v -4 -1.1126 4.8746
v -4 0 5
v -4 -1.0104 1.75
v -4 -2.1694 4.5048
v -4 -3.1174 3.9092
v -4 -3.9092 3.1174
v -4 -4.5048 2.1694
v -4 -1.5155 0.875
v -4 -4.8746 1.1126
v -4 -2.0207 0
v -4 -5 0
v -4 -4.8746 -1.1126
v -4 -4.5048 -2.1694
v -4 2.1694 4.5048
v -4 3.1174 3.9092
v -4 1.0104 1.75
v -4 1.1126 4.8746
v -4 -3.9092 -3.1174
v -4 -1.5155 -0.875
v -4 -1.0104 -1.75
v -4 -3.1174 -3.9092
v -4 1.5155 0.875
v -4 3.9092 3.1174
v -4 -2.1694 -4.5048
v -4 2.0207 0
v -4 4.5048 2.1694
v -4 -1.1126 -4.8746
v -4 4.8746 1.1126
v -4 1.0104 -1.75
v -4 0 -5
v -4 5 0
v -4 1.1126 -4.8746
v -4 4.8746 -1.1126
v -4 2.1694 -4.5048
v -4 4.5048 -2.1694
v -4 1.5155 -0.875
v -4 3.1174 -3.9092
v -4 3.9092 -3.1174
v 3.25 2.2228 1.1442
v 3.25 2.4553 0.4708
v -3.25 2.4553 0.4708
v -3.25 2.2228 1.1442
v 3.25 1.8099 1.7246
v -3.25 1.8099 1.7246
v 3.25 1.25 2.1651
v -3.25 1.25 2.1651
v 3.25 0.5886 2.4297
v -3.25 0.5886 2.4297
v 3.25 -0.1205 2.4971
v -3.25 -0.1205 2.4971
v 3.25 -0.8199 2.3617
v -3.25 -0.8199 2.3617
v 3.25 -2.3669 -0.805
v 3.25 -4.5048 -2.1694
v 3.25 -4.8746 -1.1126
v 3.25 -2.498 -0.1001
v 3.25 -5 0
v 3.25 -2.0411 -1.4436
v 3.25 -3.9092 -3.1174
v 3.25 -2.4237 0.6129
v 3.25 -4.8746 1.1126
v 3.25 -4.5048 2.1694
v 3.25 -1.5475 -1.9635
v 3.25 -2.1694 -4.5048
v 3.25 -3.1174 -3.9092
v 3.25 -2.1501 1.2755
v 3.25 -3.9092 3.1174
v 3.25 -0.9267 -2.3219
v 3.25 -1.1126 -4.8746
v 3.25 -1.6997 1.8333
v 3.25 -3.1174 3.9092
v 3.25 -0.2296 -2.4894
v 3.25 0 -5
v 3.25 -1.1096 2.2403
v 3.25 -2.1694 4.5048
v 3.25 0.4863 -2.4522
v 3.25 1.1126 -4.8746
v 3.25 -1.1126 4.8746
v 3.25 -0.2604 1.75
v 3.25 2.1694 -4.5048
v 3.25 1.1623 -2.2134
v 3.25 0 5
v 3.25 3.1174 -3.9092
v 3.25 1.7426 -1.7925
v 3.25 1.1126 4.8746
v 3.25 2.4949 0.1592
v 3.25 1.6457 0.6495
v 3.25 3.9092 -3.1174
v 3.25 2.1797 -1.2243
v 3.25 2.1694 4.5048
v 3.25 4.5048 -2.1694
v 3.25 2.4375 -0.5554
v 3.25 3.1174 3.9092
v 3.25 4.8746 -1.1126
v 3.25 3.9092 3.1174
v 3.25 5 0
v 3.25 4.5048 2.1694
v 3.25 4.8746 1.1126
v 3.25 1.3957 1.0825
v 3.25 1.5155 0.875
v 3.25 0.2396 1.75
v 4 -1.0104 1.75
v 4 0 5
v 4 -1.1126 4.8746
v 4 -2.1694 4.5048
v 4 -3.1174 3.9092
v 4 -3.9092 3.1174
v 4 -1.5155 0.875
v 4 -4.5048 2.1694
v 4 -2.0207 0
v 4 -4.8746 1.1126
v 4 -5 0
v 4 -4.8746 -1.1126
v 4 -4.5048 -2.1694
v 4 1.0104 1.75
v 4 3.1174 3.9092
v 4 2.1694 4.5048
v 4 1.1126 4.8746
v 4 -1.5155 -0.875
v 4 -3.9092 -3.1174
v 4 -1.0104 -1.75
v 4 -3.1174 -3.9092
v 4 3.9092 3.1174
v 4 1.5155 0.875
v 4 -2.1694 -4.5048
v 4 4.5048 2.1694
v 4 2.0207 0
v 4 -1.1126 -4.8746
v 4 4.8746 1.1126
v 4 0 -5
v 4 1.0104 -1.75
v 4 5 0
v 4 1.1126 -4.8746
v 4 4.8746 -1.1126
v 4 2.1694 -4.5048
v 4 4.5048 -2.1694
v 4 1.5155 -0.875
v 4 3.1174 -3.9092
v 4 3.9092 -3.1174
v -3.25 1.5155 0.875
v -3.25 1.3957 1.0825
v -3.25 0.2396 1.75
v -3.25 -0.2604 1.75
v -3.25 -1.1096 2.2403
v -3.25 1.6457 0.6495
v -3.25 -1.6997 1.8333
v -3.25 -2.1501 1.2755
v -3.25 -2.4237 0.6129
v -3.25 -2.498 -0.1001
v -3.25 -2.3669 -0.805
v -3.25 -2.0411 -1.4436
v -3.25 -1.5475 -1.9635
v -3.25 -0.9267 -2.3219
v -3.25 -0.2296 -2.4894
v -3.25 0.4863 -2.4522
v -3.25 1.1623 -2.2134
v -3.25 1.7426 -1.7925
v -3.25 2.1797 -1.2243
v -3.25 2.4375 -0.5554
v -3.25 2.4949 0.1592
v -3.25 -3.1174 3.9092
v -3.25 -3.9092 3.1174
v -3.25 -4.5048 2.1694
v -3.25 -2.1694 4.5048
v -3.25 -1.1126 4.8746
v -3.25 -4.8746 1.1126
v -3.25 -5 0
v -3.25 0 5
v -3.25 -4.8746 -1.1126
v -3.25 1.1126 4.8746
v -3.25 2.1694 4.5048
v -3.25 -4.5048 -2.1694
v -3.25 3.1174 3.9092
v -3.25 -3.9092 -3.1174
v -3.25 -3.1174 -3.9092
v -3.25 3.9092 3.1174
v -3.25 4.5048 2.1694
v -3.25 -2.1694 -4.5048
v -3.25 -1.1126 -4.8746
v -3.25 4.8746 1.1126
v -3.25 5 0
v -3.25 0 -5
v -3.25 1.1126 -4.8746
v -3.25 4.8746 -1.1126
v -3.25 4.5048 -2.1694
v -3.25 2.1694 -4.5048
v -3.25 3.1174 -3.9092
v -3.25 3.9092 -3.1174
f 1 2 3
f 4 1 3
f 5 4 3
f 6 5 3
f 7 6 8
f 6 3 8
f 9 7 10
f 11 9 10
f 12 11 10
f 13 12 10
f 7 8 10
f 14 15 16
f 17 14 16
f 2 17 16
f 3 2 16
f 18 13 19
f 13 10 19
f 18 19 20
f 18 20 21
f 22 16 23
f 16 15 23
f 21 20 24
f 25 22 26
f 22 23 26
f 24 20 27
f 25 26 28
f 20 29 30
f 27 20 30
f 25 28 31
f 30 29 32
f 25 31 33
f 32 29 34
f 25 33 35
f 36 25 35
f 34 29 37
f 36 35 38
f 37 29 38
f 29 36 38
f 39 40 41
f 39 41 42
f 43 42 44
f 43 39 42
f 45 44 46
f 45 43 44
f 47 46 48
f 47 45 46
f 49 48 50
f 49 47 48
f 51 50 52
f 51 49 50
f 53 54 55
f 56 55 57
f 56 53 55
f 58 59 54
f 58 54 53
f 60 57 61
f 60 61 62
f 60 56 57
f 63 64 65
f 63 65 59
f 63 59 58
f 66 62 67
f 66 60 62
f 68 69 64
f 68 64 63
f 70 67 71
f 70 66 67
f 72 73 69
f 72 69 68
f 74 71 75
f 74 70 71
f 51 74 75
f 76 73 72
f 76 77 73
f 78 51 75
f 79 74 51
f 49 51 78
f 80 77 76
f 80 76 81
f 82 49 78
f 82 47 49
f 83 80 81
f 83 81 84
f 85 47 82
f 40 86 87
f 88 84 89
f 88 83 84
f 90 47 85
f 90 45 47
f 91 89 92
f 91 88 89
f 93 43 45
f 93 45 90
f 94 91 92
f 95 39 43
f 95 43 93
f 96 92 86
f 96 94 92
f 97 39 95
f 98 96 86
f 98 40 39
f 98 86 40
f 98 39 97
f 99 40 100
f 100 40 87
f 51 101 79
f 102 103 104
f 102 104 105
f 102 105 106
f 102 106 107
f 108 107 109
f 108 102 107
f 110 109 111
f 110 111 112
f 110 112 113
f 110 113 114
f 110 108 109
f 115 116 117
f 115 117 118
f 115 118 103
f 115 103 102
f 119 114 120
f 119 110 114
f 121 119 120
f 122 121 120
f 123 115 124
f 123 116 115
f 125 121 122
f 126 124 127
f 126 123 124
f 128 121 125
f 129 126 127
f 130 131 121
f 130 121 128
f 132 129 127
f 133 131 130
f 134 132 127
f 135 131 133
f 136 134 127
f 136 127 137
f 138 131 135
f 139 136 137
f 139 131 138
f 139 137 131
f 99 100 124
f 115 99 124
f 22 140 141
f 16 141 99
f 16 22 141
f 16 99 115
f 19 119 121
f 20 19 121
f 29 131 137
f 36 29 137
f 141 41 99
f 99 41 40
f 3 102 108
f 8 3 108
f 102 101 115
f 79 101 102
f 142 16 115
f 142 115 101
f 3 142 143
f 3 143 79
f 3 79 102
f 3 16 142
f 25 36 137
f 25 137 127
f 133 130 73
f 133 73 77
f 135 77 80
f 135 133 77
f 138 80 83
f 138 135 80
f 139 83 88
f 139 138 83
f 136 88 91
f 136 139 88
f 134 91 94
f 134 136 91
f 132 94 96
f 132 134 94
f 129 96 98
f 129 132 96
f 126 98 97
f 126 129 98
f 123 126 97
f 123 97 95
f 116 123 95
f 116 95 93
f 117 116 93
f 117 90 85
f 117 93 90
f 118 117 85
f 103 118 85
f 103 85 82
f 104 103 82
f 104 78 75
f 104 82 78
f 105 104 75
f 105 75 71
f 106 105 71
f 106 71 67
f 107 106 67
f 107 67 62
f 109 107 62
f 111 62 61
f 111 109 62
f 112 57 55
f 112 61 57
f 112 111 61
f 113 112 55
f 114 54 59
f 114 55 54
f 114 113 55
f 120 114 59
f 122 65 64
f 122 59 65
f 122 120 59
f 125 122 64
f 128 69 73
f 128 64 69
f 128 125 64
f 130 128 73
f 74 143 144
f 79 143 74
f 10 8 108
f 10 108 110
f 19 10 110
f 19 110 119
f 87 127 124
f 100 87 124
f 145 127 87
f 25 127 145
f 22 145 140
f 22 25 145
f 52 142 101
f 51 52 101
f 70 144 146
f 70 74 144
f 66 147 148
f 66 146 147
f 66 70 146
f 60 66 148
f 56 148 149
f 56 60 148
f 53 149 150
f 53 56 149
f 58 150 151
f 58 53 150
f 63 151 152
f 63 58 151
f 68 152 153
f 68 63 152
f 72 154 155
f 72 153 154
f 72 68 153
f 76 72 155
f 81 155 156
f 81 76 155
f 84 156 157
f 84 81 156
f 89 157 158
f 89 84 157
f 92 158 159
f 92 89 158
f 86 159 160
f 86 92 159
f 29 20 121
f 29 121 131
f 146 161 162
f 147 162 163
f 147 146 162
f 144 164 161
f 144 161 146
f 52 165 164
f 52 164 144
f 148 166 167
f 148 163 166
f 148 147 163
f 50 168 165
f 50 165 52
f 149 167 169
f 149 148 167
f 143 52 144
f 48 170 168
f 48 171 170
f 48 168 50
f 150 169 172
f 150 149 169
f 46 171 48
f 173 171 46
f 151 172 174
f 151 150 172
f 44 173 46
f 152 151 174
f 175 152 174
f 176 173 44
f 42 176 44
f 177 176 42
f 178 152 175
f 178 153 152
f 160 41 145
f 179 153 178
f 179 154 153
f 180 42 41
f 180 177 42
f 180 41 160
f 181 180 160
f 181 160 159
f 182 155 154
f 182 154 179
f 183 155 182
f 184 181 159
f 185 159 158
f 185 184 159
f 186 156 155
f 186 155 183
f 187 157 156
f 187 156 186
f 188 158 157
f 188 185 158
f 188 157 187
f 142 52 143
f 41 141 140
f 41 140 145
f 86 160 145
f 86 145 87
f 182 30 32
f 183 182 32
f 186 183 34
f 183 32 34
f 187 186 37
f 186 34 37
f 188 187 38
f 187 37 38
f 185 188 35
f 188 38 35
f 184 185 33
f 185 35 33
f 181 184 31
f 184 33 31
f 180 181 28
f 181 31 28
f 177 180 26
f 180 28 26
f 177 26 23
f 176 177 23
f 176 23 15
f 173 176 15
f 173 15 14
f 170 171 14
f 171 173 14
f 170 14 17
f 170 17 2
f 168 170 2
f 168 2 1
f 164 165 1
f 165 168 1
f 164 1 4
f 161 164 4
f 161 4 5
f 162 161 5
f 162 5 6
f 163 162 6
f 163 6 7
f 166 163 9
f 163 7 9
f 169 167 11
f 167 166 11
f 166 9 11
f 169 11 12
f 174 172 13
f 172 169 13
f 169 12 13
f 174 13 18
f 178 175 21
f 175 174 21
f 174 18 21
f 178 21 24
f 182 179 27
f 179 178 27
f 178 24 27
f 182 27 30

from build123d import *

# Parameters (mm, degrees)
SKETCH1_R               = 2.5
BOSS_EXTRUDE1_DEPTH     = 4
SKETCH2_R               = 5
BOSS_EXTRUDE2_DEPTH     = 0.75
M1_6_NUT_DEPTH          = 9.124038405
M1_6_NUT_DEPTH_BACK     = 9.124038405
CUT_EXTRUDE1_DEPTH      = 10.883671537
CUT_EXTRUDE1_DEPTH_BACK = 10.883671537
SKETCH5_W               = 6.5
SKETCH5_H               = 0.25


with BuildPart() as part:
    # Sketch1 → Boss-Extrude1 (new, symmetric)
    with BuildSketch(Plane(origin=(0, 0, 0), x_dir=(0, 0, -1), z_dir=(1, 0, 0))):
        Circle(SKETCH1_R)
    extrude(amount=BOSS_EXTRUDE1_DEPTH, both=True)

    # Sketch2 → Boss-Extrude2 (add)
    with BuildSketch(Plane(origin=(4, 0, 0), x_dir=(0, 0, -1), z_dir=(1, 0, 0))):
        Circle(SKETCH2_R)
    boss_extrude2 = extrude(amount=-BOSS_EXTRUDE2_DEPTH)

    # Mirror1: Boss-Extrude2 across plane
    add(boss_extrude2.mirror(Plane(origin=(0, 0, 0), x_dir=(0, 0, 1), z_dir=(1, 0, 0))))

    # Sketch3 → M1.6 Nut (cut, two sides: drawn at the far end of the back side and taken through both)
    with BuildSketch(Plane(origin=(0, 0, 0), x_dir=(0, 0, -1), z_dir=(1, 0, 0)).offset(-M1_6_NUT_DEPTH_BACK)):
        Polygon((1.75, 0), (1.75, 1.010362971), (0.875, 1.515544457), (0, 2.020725942), (-0.875, 1.515544457), (-1.75, 1.010362971), (-1.75, 0), (-1.75, -1.010362971), (-0.875, -1.515544457), (0, -2.020725942), (0.875, -1.515544457), (1.75, -1.010362971), align=None)
    extrude(amount=M1_6_NUT_DEPTH + M1_6_NUT_DEPTH_BACK, mode=Mode.SUBTRACT)

    # Sketch5 → Cut-Extrude1 (cut, two sides: drawn at the far end of the back side and taken through both)
    with BuildSketch(Plane(origin=(0, 1.010362971, -1.75), x_dir=(1, 0, 0), z_dir=(0, -0.8660254037844384, 0.5000000000000007)).offset(-CUT_EXTRUDE1_DEPTH_BACK)):
        with Locations((0, 2.520725942)):
            Rectangle(SKETCH5_W, SKETCH5_H)
    extrude(amount=CUT_EXTRUDE1_DEPTH + CUT_EXTRUDE1_DEPTH_BACK, mode=Mode.SUBTRACT)


solid = part.part
